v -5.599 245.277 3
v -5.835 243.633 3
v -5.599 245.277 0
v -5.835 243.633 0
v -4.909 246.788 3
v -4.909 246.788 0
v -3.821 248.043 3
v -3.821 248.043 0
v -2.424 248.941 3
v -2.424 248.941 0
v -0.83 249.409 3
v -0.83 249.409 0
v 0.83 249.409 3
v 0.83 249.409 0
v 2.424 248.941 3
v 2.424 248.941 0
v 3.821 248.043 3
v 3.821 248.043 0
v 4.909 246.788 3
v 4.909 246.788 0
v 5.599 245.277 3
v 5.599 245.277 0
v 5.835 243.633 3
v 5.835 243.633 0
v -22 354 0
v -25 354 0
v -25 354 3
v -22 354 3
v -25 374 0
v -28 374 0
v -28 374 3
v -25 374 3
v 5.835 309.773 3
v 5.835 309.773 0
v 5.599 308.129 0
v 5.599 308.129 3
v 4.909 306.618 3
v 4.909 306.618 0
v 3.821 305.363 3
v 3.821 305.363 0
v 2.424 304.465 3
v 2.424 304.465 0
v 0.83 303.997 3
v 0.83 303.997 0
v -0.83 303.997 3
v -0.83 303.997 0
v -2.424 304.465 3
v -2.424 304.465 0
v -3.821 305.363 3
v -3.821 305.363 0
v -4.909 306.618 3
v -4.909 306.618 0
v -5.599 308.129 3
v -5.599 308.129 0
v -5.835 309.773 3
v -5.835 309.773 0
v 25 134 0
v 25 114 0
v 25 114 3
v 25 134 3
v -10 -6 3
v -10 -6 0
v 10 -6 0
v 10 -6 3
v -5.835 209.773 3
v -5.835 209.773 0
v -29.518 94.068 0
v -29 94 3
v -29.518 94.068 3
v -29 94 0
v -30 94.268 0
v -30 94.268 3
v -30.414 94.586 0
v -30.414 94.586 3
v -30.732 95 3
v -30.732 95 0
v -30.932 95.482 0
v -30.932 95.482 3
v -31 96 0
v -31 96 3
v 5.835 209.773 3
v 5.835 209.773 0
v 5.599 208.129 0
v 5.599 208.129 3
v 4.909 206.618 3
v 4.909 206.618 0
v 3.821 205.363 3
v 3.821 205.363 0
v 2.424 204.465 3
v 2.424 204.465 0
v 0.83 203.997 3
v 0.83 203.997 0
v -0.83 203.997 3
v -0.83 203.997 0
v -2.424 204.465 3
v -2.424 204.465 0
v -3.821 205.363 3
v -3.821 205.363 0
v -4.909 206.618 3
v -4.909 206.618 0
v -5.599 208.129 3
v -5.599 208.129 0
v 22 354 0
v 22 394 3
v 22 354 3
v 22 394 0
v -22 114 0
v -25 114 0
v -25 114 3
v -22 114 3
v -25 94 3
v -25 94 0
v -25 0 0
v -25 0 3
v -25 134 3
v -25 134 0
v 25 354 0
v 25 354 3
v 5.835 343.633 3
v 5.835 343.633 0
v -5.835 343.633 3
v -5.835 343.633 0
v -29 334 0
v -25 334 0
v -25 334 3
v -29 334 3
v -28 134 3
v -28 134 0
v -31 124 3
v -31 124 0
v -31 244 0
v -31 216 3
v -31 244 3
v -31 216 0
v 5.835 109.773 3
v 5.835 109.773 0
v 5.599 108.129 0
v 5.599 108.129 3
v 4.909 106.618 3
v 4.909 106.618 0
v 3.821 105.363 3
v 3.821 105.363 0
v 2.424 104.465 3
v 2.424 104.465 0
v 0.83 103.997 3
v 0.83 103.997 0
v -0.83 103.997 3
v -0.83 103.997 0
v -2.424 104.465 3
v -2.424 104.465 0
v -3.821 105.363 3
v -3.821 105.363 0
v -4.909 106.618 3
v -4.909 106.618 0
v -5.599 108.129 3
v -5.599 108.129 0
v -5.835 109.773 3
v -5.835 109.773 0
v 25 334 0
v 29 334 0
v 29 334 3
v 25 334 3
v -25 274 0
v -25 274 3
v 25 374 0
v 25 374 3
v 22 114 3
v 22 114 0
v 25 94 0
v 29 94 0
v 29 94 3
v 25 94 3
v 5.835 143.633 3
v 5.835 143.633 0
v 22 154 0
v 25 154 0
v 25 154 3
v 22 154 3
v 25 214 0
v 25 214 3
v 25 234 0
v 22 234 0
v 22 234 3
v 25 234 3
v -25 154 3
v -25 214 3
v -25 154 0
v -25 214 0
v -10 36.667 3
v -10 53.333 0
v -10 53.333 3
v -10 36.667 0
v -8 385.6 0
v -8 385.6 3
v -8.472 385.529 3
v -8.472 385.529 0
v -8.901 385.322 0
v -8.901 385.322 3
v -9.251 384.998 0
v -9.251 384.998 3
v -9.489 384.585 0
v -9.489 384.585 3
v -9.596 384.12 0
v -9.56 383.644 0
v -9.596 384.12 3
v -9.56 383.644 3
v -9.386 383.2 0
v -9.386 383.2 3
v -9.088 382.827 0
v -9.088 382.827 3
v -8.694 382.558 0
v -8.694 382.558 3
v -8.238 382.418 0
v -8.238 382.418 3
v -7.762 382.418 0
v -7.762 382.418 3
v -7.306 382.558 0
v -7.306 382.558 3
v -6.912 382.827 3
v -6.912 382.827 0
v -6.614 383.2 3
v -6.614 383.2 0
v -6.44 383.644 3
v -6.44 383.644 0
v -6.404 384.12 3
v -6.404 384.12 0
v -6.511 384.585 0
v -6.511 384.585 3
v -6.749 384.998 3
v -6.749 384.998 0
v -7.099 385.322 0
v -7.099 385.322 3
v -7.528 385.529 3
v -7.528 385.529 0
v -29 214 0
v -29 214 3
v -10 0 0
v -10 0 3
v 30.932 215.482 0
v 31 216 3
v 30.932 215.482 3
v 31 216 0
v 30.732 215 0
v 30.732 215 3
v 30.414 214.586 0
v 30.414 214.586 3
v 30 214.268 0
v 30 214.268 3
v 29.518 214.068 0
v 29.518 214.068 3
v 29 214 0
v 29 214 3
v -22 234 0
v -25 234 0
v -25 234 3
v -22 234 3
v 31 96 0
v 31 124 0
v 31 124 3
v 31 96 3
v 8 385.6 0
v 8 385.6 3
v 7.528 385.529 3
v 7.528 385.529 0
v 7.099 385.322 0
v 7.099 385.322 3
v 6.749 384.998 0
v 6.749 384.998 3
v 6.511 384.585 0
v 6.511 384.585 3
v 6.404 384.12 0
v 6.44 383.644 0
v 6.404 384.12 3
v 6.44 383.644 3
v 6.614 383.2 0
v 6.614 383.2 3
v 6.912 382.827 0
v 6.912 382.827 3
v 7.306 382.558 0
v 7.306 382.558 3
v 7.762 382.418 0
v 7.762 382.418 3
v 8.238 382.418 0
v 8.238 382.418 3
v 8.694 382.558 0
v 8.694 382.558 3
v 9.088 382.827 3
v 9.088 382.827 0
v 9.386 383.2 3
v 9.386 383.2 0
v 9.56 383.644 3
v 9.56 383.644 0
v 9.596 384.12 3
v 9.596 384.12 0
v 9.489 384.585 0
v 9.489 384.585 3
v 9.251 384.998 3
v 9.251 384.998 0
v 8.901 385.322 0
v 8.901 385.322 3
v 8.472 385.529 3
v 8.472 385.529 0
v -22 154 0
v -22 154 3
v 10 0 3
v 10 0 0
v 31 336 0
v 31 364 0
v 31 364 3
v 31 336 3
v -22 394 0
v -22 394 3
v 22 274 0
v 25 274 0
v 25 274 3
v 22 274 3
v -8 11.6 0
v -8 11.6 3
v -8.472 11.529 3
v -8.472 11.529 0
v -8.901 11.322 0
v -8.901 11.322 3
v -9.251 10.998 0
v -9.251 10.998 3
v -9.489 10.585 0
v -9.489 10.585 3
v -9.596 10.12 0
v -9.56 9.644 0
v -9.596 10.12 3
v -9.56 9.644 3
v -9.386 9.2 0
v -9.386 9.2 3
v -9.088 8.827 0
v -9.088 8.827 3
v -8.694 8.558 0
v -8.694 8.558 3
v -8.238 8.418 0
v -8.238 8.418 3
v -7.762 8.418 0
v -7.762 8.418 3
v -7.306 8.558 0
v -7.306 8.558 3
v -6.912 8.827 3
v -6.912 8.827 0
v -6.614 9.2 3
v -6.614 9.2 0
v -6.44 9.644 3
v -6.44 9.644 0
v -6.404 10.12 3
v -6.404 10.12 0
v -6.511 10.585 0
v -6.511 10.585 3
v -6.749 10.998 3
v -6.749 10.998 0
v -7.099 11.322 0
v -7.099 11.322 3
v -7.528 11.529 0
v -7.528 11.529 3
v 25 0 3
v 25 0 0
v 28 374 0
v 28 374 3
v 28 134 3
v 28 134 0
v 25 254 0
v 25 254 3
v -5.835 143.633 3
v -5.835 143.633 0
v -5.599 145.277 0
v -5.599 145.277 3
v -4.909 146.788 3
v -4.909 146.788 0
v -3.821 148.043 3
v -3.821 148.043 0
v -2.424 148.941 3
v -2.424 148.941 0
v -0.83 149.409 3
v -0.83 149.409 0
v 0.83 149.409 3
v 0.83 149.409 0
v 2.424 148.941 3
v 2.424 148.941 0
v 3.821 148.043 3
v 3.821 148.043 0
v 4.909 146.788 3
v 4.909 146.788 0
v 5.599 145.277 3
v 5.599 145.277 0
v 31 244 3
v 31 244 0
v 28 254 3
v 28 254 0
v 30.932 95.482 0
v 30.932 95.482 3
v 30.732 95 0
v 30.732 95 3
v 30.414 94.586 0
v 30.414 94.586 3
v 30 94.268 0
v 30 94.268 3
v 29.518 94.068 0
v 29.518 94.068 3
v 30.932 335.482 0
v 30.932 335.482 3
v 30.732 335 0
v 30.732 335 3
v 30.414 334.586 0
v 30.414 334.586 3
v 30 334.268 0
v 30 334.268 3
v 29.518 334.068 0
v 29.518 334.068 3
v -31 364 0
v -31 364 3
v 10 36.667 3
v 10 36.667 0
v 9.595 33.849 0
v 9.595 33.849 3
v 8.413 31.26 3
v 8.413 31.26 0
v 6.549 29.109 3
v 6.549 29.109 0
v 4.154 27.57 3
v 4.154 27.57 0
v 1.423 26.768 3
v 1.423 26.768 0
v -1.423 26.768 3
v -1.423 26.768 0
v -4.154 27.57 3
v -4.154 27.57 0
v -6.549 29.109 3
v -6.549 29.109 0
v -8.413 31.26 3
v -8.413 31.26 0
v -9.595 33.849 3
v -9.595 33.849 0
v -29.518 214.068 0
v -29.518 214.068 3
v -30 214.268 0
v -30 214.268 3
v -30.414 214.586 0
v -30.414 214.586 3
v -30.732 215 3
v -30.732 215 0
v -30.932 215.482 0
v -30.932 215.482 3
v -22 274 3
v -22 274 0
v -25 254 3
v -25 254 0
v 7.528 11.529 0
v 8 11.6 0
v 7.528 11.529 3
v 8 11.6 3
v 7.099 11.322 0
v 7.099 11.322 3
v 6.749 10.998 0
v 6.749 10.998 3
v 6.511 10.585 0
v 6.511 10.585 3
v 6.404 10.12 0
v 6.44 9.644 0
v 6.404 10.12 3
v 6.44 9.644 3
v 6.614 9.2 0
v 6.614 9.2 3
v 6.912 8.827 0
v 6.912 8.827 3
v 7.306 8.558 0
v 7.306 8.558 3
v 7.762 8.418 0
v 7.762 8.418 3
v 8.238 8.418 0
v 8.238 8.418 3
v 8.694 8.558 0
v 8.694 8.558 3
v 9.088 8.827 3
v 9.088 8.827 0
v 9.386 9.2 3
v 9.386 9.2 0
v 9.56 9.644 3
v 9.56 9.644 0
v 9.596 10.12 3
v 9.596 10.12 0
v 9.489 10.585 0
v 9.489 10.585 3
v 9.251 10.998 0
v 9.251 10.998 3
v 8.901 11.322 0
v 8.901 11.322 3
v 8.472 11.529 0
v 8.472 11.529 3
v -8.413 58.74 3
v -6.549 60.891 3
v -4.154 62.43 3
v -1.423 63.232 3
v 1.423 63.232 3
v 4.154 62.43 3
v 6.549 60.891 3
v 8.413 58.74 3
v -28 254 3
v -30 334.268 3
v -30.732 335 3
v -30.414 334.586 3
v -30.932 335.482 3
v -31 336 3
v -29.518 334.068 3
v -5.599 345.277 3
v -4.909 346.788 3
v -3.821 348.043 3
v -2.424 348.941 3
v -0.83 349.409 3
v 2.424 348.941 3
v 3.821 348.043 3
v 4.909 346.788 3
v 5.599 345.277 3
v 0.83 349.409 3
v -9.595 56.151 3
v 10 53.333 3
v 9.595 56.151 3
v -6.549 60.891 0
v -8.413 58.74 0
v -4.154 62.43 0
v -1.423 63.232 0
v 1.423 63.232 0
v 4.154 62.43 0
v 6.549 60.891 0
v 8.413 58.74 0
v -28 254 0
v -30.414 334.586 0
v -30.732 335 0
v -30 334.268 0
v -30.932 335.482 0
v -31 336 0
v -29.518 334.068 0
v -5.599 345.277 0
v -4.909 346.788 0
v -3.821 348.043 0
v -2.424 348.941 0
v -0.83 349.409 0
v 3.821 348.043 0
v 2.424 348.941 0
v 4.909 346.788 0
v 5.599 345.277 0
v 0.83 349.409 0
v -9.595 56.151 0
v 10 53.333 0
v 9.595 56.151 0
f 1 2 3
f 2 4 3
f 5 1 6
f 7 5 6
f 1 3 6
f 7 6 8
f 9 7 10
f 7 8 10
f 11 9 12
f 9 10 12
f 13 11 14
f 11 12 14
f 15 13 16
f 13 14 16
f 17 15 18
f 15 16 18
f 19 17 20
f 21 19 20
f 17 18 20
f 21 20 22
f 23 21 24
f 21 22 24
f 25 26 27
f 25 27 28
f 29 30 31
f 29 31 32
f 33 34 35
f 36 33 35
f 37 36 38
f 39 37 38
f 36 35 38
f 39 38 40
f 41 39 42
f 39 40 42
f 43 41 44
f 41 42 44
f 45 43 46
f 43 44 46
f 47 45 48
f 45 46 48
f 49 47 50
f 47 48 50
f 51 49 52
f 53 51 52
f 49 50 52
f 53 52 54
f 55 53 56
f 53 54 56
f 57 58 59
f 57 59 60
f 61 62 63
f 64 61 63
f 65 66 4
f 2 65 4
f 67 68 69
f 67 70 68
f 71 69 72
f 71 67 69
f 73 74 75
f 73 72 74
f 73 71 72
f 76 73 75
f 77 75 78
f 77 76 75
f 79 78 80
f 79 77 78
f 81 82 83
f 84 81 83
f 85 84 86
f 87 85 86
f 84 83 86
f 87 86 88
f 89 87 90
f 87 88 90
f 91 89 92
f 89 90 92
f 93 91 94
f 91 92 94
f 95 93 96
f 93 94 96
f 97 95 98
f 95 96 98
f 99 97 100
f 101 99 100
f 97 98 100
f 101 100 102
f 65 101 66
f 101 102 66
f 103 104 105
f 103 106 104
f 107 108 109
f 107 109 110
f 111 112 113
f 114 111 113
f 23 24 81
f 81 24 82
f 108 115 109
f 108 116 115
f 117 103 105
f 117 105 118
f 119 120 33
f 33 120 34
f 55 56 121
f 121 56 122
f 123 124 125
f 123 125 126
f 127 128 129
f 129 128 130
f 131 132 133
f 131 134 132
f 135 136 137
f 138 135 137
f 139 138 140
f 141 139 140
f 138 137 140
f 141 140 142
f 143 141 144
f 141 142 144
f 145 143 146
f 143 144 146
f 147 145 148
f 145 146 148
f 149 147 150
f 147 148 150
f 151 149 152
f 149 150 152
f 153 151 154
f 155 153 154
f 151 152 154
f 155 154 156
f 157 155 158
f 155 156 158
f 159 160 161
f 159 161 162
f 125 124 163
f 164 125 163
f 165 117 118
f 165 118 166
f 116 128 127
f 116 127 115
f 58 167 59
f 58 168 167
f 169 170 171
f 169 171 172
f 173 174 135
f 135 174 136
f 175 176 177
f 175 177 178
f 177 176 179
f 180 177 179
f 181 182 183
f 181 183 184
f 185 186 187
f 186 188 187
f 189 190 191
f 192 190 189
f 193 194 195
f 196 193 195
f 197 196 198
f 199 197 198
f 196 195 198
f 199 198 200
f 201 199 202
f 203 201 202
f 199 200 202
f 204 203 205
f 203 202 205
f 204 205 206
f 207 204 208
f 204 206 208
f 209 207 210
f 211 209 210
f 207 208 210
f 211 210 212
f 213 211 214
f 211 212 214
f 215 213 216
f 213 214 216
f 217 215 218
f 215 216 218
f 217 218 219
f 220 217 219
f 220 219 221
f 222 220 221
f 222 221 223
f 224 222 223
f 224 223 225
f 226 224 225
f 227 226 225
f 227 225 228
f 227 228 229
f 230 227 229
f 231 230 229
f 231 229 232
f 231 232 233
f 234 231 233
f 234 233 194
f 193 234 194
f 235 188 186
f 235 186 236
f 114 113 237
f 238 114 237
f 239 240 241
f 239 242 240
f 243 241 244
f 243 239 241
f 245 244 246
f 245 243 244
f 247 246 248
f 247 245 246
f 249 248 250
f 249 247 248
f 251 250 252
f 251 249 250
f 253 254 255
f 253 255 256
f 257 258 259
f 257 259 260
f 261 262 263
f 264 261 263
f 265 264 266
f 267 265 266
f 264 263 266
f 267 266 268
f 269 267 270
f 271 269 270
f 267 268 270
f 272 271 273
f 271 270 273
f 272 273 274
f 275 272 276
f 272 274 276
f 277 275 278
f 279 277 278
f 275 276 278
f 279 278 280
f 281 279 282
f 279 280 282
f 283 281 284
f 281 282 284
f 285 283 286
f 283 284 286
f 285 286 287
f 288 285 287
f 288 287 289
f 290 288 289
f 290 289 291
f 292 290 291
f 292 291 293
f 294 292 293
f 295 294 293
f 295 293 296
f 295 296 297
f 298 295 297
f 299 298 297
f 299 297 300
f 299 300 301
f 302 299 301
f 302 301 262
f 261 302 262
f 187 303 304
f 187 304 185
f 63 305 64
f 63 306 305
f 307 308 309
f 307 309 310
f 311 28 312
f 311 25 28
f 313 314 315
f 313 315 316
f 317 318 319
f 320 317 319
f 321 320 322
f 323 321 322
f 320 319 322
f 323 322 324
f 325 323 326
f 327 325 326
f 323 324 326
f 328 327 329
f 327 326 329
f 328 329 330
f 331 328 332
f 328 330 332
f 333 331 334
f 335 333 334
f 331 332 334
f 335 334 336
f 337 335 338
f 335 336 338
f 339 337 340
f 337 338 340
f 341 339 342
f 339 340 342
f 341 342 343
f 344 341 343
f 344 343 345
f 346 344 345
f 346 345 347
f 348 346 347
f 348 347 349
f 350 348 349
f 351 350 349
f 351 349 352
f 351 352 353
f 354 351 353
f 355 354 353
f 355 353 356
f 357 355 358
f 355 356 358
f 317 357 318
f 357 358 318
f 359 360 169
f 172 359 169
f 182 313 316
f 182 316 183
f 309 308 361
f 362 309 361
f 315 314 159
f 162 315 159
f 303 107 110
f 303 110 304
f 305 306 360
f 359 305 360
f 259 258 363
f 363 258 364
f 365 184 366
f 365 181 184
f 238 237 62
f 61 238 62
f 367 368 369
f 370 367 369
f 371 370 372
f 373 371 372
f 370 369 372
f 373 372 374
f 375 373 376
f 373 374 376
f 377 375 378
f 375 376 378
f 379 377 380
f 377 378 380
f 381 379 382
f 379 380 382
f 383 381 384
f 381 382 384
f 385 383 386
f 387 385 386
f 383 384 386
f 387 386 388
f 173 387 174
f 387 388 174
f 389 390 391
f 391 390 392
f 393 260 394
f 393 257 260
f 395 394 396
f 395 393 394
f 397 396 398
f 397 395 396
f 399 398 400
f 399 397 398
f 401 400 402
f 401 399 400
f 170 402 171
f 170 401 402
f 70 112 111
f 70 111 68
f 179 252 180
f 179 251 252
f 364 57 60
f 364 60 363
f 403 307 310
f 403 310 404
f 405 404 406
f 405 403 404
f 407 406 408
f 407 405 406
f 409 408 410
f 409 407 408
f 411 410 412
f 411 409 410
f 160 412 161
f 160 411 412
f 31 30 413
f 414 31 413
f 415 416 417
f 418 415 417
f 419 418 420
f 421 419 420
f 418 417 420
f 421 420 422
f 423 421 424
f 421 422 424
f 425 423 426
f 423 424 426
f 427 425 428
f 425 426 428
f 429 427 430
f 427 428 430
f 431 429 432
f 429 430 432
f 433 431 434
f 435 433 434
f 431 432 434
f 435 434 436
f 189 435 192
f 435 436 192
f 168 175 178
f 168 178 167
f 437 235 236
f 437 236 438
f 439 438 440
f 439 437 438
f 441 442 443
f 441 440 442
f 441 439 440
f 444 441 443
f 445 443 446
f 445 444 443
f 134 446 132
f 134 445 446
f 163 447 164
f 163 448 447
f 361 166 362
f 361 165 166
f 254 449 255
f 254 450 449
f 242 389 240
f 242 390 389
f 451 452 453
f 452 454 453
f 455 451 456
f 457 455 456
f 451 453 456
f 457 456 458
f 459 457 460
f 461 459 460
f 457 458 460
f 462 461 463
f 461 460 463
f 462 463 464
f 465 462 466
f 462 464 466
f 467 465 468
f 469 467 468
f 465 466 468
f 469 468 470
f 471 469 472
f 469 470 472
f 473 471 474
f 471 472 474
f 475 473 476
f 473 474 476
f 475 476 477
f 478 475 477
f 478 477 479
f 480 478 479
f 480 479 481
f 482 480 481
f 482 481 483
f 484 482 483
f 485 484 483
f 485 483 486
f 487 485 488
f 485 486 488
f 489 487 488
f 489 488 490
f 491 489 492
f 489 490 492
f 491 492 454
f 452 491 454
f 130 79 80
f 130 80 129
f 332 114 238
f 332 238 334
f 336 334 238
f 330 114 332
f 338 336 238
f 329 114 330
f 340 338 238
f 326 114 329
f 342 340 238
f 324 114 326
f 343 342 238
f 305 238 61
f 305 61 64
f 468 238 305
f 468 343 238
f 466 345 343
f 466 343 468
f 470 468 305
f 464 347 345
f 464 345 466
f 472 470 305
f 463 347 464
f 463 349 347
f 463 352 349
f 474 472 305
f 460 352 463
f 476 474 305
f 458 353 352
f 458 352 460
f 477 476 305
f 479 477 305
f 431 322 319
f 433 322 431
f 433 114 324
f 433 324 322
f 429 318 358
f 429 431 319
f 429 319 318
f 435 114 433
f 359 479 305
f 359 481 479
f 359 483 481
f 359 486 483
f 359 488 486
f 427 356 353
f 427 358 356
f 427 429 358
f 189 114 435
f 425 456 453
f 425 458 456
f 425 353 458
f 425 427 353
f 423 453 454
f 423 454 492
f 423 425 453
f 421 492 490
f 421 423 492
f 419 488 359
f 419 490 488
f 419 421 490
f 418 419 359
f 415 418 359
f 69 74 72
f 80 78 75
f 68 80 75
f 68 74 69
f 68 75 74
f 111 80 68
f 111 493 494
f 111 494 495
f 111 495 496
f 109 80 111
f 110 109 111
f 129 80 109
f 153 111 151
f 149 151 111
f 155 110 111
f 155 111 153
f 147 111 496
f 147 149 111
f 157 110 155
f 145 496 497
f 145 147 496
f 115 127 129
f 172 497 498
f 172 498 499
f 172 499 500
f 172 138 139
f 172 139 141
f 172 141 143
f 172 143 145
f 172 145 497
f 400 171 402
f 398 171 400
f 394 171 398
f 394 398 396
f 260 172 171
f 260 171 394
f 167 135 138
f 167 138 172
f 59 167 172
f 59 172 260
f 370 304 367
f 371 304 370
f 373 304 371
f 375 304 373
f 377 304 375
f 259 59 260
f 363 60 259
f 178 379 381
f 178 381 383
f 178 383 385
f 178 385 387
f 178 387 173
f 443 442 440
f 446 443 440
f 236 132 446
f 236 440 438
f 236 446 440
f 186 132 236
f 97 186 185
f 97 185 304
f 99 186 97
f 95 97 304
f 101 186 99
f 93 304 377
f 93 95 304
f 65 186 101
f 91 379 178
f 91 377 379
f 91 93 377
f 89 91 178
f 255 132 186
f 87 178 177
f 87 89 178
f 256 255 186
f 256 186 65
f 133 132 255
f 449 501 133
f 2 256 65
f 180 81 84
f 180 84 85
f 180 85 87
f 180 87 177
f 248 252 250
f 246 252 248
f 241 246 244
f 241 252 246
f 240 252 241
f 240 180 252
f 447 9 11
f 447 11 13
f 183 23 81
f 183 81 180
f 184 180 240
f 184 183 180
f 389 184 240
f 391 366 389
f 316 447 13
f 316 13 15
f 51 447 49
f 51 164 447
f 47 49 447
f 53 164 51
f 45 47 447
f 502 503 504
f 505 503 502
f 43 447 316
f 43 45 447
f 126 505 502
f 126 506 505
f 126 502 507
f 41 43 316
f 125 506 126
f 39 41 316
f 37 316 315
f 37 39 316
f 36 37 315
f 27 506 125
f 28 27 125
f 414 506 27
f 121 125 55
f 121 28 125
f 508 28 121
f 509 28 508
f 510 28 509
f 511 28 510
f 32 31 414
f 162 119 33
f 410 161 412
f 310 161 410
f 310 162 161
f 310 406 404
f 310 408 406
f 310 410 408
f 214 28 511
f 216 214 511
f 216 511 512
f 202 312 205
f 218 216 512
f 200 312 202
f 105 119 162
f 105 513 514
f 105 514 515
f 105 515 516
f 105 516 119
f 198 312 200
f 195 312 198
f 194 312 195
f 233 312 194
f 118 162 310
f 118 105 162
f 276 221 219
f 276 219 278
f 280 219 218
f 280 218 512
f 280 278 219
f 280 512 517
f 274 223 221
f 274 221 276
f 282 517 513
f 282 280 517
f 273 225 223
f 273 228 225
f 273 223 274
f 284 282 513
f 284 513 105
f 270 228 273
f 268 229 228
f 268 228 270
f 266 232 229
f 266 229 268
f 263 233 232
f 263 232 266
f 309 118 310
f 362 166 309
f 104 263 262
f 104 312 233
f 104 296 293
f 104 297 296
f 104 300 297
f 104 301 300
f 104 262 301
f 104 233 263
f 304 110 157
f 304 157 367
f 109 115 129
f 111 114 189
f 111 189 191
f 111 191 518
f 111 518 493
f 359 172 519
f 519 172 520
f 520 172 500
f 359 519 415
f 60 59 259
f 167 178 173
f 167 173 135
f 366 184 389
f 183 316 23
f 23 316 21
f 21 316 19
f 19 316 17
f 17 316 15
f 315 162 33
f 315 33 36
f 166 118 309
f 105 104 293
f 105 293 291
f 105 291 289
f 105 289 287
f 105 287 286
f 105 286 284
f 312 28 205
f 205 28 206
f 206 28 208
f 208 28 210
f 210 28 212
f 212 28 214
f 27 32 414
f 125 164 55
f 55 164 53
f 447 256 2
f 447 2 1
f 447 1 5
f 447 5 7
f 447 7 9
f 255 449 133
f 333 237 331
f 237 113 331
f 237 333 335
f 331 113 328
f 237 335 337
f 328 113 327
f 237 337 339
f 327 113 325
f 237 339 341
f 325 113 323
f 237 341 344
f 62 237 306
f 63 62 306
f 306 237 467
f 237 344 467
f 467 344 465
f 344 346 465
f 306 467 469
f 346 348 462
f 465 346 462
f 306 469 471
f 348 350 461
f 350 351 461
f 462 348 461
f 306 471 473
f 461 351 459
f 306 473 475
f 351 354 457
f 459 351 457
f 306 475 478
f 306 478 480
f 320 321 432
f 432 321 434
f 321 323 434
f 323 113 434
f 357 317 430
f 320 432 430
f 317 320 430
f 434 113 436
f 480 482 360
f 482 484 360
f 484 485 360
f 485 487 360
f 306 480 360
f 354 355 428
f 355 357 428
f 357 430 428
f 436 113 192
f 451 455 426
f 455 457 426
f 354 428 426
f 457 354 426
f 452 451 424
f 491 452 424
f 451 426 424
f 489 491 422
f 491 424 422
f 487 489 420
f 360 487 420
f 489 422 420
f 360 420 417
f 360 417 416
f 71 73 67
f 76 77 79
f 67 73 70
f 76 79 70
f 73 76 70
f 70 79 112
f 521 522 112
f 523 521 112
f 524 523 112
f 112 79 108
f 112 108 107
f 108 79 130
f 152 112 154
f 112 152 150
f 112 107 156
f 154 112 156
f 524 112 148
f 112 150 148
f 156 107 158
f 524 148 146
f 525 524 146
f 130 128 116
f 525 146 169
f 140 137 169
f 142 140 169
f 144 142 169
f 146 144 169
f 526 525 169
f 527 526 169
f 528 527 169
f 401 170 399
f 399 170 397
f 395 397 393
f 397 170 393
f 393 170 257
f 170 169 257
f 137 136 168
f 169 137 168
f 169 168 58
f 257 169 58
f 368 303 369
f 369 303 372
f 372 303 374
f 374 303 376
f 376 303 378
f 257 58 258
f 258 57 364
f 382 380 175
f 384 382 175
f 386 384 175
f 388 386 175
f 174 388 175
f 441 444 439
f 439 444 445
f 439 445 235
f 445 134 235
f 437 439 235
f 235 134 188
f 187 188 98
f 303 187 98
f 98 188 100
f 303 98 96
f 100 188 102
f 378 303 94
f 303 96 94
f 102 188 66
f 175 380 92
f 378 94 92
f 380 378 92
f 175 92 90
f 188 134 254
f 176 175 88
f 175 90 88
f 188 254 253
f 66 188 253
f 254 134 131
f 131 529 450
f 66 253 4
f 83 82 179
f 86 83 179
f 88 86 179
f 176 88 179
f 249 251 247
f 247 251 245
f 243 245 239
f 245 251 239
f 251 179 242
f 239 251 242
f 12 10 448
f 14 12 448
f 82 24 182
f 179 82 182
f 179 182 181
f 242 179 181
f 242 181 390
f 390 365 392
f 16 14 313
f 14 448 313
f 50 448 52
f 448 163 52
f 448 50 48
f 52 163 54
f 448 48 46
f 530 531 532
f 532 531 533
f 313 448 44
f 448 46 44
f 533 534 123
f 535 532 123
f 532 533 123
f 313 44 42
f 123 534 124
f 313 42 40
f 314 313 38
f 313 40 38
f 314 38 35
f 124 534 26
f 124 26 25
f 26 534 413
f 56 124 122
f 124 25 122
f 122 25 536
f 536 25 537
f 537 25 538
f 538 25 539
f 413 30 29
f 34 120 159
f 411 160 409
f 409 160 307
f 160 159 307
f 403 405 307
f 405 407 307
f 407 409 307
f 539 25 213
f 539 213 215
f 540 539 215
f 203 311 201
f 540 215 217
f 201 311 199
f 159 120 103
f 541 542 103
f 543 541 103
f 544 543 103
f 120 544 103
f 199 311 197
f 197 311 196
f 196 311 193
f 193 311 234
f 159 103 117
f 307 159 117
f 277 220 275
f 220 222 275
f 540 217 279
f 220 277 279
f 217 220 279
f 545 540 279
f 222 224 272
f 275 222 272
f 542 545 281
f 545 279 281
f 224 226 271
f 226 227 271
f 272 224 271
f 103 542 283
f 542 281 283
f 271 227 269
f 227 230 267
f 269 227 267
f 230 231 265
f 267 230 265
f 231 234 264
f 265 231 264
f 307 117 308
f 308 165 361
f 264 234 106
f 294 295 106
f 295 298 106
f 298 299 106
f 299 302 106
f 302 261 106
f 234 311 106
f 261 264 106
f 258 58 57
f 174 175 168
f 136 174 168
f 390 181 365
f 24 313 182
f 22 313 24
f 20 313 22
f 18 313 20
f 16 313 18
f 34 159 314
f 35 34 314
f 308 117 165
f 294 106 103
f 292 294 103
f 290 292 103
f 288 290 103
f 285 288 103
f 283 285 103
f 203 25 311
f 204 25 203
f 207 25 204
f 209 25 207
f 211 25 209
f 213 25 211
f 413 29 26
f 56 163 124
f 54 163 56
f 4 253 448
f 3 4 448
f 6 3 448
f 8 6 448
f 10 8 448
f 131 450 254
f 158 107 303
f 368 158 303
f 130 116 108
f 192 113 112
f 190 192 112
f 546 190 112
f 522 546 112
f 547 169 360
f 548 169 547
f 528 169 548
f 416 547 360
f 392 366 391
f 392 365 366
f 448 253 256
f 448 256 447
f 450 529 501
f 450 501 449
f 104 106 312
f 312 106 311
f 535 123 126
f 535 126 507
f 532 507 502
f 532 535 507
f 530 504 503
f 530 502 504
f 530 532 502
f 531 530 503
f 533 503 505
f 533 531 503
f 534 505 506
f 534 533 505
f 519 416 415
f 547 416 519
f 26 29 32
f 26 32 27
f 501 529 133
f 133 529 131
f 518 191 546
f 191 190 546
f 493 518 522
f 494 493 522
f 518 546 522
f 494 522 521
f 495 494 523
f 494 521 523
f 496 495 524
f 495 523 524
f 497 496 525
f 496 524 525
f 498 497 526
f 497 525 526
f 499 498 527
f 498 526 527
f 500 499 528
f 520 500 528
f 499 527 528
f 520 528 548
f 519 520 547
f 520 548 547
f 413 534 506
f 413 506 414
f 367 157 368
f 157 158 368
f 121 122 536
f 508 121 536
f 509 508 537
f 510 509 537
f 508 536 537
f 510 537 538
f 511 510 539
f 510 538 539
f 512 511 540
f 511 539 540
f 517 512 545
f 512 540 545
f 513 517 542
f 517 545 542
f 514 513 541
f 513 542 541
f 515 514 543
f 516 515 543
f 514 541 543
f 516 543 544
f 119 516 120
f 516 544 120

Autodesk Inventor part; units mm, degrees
ref_plane "YZ Plane" through (0, 0, 0) normal (1, 0, 0) x (0, 1, 0)
ref_plane "XZ Plane" through (0, 0, 0) normal (0, 1, 0) x (-1, 0, 0)
ref_plane "XY Plane" through (0, 0, 0) normal (0, 0, 1) x (1, 0, 0)
sketch "Sketch1" plane through (0, 0, 0) normal (0, 0, 1) x (1, 0, 0)
  line L0 (-25, 0) -> (25, 0)
  line L1 (25, 0) -> (25, 394)
  line L2 (25, 394) -> (-25, 394)
  line L3 (-25, 394) -> (-25, 0)
  point P0 (0, 0)
  point P1 (0, 0)
  dimension "d0" = 394
  dimension "d1" = 50
extrude "Extrusion1" add sketch "Sketch1" along normal blind 3
sketch "Sketch2" plane through (0, 0, 0) normal (0, 0, -1) x (-1, 0, 0)
  line L0 (-22, 334) -> (-25, 334)
  line L1 (-22, 374) -> (-25, 374)
  line L2 (-22, 374) -> (-22, 354)
  line L3 (-25, 334) -> (-25, 354)
  line L4 (-25, 0) -> (-25, 394) projected
  line L5 (-22, 354) -> (-25, 354)
  line L6 (-25, 0) -> (-25, 394) projected
  line L7 (-25, 394) -> (25, 394) projected
  line L8 (-25, 354) -> (-25, 374)
  line L9 (-22, 354) -> (-22, 334)
  line L10 (-22, 374) -> (-25, 374)
  line L11 (-25, 374) -> (-25, 394)
  line L12 (-25, 394) -> (-22, 394)
  line L13 (-22, 394) -> (-22, 374)
  point P0 (0, 0)
  dimension "d4" = 20
  dimension "d10" = 20
  dimension "d55" = 60
  dimension "d56" = 20
extrude "Extrusion2" cut sketch "Sketch2" against normal blind 3 contours L5 L4 L1 L2 | L1 L4 L7 L13
sketch "Sketch3" plane through (0, 0, 0) normal (0, 0, -1) x (-1, 0, 0)
  line L0 (-25, 0) -> (-25, 354) projected
  line L1 (-25, 354) -> (-31, 354)
  line L2 (-31, 354) -> (-31, 336)
  line L3 (-29, 334) -> (-25, 334)
  line L4 (-25, 334) -> (-25, 354)
  line L5 (-31, 354) -> (-25, 354)
  line L6 (-25, 354) -> (-25, 374)
  line L7 (-25, 374) -> (-28, 374)
  line L8 (-31, 364) -> (-31, 354)
  line L9 (-31, 364) -> (-28, 374)
  line L10 (-28, 374) -> (-31, 374) construction
  arc A0 (-31, 336) -> (-29, 334) centre (-29, 336) ccw
  point P0 (0, 0)
  point P1 (-31, 334)
  dimension "d11" = 20
  dimension "d12" = 20
  dimension "d13" = 6
  dimension "d16" = 2
extrude "Extrusion3" add sketch "Sketch3" against normal blind 3
pattern_linear "Rectangular Pattern1" count 3 spacing 120 along (0, -1, 0) of "Extrusion2", "Extrusion3"
mirror "Mirror1" about plane through (0, 0, 0) normal (1, 0, 0) of "Extrusion2", "Rectangular Pattern1", "Extrusion3"
sketch "Sketch4" plane through (0, 0, 0) normal (0, 0, -1) x (-1, 0, 0)
  line L0 (-22, 384) -> (18.49, 384) construction
  line L1 (-22, 394) -> (22, 394) projected
  line L2 (-22, 394) -> (-22, 354) projected
  point P0 (0, 0)
  point P1 (-8, 384)
  point P2 (8, 384)
  dimension "d17" = 16
  dimension "d52" = 10
  dimension "d53" = 14
hole "Hole1" at (8, 384, 0) at (-8, 384, 0) direction (0, 0, 1) diameter 3.2 end through all
sketch "Sketch5" plane through (0, 0, 0) normal (0, 0, -1) x (-1, 0, 0)
  line L0 (-10, 0) -> (10, 0)
  line L1 (-10, 0) -> (-10, -6)
  line L2 (10, -6) -> (-10, -6)
  line L3 (10, 0) -> (10, -6)
  line L4 (25, 94) -> (25, 0) projected
  point P0 (0, 0)
  dimension "d48" = 6
  dimension "d50" = 20
  dimension "d51" = 15
extrude "Extrusion4" add sketch "Sketch5" against normal blind 3
sketch "Sketch6" plane through (0, 0, 0) normal (0, 0, -1) x (-1, 0, 0)
  line L0 (0, 36.6667) -> (0, 53.3333) construction
  line L1 (-10, 36.6667) -> (-10, 53.3333)
  line L2 (10, 53.3333) -> (10, 36.6667)
  arc A0 (-10, 36.6667) -> (10, 36.6667) centre (0, 36.6667) ccw
  arc A1 (10, 53.3333) -> (-10, 53.3333) centre (0, 53.3333) ccw
  line L3 (0, 343.6331) -> (0, 309.773) construction
  line L4 (-5.8349, 343.6331) -> (-5.8349, 309.773)
  line L5 (5.8349, 309.773) -> (5.8349, 343.6331)
  arc A2 (5.8349, 343.6331) -> (-5.8349, 343.6331) centre (0, 343.6331) ccw
  arc A3 (-5.8349, 309.773) -> (5.8349, 309.773) centre (0, 309.773) ccw
  line L6 (0, 243.6331) -> (0, 209.773) construction
  line L7 (-5.8349, 243.6331) -> (-5.8349, 209.773)
  line L8 (5.8349, 209.773) -> (5.8349, 243.6331)
  arc A4 (5.8349, 243.6331) -> (-5.8349, 243.6331) centre (0, 243.6331) ccw
  arc A5 (-5.8349, 209.773) -> (5.8349, 209.773) centre (0, 209.773) ccw
  line L9 (0, 143.6331) -> (0, 109.773) construction
  line L10 (-5.8349, 143.6331) -> (-5.8349, 109.773)
  line L11 (5.8349, 109.773) -> (5.8349, 143.6331)
  arc A6 (5.8349, 143.6331) -> (-5.8349, 143.6331) centre (0, 143.6331) ccw
  arc A7 (-5.8349, 109.773) -> (5.8349, 109.773) centre (0, 109.773) ccw
  point P0 (0, 0)
  point P1 (0, 45)
  point P2 (0, 326.7031)
  point P3 (0, 226.7031)
  point P4 (0, 126.7031)
  dimension "d28" = 10
  dimension "d29" = 45
  dimension "d43" = 100
extrude "Extrusion5" cut sketch "Sketch6" against normal blind 3
sketch "Sketch7" plane through (0, 0, 0) normal (0, 0, -1) x (-1, 0, 0)
  line L0 (-22, 10) -> (26.4852, 10) construction
  line L1 (-25, 0) -> (-25, 94) projected
  line L2 (-10, 0) -> (-25, 0) projected
  point P0 (0, 0)
  point P1 (-8, 10)
  point P2 (8, 10)
  dimension "d32" = 16
  dimension "d33" = 17
  dimension "d54" = 10
hole "Hole2" at (8, 10, 0) at (-8, 10, 0) direction (0, 0, 1) diameter 3.2 end through all
properties part number "Camera mounting back"
